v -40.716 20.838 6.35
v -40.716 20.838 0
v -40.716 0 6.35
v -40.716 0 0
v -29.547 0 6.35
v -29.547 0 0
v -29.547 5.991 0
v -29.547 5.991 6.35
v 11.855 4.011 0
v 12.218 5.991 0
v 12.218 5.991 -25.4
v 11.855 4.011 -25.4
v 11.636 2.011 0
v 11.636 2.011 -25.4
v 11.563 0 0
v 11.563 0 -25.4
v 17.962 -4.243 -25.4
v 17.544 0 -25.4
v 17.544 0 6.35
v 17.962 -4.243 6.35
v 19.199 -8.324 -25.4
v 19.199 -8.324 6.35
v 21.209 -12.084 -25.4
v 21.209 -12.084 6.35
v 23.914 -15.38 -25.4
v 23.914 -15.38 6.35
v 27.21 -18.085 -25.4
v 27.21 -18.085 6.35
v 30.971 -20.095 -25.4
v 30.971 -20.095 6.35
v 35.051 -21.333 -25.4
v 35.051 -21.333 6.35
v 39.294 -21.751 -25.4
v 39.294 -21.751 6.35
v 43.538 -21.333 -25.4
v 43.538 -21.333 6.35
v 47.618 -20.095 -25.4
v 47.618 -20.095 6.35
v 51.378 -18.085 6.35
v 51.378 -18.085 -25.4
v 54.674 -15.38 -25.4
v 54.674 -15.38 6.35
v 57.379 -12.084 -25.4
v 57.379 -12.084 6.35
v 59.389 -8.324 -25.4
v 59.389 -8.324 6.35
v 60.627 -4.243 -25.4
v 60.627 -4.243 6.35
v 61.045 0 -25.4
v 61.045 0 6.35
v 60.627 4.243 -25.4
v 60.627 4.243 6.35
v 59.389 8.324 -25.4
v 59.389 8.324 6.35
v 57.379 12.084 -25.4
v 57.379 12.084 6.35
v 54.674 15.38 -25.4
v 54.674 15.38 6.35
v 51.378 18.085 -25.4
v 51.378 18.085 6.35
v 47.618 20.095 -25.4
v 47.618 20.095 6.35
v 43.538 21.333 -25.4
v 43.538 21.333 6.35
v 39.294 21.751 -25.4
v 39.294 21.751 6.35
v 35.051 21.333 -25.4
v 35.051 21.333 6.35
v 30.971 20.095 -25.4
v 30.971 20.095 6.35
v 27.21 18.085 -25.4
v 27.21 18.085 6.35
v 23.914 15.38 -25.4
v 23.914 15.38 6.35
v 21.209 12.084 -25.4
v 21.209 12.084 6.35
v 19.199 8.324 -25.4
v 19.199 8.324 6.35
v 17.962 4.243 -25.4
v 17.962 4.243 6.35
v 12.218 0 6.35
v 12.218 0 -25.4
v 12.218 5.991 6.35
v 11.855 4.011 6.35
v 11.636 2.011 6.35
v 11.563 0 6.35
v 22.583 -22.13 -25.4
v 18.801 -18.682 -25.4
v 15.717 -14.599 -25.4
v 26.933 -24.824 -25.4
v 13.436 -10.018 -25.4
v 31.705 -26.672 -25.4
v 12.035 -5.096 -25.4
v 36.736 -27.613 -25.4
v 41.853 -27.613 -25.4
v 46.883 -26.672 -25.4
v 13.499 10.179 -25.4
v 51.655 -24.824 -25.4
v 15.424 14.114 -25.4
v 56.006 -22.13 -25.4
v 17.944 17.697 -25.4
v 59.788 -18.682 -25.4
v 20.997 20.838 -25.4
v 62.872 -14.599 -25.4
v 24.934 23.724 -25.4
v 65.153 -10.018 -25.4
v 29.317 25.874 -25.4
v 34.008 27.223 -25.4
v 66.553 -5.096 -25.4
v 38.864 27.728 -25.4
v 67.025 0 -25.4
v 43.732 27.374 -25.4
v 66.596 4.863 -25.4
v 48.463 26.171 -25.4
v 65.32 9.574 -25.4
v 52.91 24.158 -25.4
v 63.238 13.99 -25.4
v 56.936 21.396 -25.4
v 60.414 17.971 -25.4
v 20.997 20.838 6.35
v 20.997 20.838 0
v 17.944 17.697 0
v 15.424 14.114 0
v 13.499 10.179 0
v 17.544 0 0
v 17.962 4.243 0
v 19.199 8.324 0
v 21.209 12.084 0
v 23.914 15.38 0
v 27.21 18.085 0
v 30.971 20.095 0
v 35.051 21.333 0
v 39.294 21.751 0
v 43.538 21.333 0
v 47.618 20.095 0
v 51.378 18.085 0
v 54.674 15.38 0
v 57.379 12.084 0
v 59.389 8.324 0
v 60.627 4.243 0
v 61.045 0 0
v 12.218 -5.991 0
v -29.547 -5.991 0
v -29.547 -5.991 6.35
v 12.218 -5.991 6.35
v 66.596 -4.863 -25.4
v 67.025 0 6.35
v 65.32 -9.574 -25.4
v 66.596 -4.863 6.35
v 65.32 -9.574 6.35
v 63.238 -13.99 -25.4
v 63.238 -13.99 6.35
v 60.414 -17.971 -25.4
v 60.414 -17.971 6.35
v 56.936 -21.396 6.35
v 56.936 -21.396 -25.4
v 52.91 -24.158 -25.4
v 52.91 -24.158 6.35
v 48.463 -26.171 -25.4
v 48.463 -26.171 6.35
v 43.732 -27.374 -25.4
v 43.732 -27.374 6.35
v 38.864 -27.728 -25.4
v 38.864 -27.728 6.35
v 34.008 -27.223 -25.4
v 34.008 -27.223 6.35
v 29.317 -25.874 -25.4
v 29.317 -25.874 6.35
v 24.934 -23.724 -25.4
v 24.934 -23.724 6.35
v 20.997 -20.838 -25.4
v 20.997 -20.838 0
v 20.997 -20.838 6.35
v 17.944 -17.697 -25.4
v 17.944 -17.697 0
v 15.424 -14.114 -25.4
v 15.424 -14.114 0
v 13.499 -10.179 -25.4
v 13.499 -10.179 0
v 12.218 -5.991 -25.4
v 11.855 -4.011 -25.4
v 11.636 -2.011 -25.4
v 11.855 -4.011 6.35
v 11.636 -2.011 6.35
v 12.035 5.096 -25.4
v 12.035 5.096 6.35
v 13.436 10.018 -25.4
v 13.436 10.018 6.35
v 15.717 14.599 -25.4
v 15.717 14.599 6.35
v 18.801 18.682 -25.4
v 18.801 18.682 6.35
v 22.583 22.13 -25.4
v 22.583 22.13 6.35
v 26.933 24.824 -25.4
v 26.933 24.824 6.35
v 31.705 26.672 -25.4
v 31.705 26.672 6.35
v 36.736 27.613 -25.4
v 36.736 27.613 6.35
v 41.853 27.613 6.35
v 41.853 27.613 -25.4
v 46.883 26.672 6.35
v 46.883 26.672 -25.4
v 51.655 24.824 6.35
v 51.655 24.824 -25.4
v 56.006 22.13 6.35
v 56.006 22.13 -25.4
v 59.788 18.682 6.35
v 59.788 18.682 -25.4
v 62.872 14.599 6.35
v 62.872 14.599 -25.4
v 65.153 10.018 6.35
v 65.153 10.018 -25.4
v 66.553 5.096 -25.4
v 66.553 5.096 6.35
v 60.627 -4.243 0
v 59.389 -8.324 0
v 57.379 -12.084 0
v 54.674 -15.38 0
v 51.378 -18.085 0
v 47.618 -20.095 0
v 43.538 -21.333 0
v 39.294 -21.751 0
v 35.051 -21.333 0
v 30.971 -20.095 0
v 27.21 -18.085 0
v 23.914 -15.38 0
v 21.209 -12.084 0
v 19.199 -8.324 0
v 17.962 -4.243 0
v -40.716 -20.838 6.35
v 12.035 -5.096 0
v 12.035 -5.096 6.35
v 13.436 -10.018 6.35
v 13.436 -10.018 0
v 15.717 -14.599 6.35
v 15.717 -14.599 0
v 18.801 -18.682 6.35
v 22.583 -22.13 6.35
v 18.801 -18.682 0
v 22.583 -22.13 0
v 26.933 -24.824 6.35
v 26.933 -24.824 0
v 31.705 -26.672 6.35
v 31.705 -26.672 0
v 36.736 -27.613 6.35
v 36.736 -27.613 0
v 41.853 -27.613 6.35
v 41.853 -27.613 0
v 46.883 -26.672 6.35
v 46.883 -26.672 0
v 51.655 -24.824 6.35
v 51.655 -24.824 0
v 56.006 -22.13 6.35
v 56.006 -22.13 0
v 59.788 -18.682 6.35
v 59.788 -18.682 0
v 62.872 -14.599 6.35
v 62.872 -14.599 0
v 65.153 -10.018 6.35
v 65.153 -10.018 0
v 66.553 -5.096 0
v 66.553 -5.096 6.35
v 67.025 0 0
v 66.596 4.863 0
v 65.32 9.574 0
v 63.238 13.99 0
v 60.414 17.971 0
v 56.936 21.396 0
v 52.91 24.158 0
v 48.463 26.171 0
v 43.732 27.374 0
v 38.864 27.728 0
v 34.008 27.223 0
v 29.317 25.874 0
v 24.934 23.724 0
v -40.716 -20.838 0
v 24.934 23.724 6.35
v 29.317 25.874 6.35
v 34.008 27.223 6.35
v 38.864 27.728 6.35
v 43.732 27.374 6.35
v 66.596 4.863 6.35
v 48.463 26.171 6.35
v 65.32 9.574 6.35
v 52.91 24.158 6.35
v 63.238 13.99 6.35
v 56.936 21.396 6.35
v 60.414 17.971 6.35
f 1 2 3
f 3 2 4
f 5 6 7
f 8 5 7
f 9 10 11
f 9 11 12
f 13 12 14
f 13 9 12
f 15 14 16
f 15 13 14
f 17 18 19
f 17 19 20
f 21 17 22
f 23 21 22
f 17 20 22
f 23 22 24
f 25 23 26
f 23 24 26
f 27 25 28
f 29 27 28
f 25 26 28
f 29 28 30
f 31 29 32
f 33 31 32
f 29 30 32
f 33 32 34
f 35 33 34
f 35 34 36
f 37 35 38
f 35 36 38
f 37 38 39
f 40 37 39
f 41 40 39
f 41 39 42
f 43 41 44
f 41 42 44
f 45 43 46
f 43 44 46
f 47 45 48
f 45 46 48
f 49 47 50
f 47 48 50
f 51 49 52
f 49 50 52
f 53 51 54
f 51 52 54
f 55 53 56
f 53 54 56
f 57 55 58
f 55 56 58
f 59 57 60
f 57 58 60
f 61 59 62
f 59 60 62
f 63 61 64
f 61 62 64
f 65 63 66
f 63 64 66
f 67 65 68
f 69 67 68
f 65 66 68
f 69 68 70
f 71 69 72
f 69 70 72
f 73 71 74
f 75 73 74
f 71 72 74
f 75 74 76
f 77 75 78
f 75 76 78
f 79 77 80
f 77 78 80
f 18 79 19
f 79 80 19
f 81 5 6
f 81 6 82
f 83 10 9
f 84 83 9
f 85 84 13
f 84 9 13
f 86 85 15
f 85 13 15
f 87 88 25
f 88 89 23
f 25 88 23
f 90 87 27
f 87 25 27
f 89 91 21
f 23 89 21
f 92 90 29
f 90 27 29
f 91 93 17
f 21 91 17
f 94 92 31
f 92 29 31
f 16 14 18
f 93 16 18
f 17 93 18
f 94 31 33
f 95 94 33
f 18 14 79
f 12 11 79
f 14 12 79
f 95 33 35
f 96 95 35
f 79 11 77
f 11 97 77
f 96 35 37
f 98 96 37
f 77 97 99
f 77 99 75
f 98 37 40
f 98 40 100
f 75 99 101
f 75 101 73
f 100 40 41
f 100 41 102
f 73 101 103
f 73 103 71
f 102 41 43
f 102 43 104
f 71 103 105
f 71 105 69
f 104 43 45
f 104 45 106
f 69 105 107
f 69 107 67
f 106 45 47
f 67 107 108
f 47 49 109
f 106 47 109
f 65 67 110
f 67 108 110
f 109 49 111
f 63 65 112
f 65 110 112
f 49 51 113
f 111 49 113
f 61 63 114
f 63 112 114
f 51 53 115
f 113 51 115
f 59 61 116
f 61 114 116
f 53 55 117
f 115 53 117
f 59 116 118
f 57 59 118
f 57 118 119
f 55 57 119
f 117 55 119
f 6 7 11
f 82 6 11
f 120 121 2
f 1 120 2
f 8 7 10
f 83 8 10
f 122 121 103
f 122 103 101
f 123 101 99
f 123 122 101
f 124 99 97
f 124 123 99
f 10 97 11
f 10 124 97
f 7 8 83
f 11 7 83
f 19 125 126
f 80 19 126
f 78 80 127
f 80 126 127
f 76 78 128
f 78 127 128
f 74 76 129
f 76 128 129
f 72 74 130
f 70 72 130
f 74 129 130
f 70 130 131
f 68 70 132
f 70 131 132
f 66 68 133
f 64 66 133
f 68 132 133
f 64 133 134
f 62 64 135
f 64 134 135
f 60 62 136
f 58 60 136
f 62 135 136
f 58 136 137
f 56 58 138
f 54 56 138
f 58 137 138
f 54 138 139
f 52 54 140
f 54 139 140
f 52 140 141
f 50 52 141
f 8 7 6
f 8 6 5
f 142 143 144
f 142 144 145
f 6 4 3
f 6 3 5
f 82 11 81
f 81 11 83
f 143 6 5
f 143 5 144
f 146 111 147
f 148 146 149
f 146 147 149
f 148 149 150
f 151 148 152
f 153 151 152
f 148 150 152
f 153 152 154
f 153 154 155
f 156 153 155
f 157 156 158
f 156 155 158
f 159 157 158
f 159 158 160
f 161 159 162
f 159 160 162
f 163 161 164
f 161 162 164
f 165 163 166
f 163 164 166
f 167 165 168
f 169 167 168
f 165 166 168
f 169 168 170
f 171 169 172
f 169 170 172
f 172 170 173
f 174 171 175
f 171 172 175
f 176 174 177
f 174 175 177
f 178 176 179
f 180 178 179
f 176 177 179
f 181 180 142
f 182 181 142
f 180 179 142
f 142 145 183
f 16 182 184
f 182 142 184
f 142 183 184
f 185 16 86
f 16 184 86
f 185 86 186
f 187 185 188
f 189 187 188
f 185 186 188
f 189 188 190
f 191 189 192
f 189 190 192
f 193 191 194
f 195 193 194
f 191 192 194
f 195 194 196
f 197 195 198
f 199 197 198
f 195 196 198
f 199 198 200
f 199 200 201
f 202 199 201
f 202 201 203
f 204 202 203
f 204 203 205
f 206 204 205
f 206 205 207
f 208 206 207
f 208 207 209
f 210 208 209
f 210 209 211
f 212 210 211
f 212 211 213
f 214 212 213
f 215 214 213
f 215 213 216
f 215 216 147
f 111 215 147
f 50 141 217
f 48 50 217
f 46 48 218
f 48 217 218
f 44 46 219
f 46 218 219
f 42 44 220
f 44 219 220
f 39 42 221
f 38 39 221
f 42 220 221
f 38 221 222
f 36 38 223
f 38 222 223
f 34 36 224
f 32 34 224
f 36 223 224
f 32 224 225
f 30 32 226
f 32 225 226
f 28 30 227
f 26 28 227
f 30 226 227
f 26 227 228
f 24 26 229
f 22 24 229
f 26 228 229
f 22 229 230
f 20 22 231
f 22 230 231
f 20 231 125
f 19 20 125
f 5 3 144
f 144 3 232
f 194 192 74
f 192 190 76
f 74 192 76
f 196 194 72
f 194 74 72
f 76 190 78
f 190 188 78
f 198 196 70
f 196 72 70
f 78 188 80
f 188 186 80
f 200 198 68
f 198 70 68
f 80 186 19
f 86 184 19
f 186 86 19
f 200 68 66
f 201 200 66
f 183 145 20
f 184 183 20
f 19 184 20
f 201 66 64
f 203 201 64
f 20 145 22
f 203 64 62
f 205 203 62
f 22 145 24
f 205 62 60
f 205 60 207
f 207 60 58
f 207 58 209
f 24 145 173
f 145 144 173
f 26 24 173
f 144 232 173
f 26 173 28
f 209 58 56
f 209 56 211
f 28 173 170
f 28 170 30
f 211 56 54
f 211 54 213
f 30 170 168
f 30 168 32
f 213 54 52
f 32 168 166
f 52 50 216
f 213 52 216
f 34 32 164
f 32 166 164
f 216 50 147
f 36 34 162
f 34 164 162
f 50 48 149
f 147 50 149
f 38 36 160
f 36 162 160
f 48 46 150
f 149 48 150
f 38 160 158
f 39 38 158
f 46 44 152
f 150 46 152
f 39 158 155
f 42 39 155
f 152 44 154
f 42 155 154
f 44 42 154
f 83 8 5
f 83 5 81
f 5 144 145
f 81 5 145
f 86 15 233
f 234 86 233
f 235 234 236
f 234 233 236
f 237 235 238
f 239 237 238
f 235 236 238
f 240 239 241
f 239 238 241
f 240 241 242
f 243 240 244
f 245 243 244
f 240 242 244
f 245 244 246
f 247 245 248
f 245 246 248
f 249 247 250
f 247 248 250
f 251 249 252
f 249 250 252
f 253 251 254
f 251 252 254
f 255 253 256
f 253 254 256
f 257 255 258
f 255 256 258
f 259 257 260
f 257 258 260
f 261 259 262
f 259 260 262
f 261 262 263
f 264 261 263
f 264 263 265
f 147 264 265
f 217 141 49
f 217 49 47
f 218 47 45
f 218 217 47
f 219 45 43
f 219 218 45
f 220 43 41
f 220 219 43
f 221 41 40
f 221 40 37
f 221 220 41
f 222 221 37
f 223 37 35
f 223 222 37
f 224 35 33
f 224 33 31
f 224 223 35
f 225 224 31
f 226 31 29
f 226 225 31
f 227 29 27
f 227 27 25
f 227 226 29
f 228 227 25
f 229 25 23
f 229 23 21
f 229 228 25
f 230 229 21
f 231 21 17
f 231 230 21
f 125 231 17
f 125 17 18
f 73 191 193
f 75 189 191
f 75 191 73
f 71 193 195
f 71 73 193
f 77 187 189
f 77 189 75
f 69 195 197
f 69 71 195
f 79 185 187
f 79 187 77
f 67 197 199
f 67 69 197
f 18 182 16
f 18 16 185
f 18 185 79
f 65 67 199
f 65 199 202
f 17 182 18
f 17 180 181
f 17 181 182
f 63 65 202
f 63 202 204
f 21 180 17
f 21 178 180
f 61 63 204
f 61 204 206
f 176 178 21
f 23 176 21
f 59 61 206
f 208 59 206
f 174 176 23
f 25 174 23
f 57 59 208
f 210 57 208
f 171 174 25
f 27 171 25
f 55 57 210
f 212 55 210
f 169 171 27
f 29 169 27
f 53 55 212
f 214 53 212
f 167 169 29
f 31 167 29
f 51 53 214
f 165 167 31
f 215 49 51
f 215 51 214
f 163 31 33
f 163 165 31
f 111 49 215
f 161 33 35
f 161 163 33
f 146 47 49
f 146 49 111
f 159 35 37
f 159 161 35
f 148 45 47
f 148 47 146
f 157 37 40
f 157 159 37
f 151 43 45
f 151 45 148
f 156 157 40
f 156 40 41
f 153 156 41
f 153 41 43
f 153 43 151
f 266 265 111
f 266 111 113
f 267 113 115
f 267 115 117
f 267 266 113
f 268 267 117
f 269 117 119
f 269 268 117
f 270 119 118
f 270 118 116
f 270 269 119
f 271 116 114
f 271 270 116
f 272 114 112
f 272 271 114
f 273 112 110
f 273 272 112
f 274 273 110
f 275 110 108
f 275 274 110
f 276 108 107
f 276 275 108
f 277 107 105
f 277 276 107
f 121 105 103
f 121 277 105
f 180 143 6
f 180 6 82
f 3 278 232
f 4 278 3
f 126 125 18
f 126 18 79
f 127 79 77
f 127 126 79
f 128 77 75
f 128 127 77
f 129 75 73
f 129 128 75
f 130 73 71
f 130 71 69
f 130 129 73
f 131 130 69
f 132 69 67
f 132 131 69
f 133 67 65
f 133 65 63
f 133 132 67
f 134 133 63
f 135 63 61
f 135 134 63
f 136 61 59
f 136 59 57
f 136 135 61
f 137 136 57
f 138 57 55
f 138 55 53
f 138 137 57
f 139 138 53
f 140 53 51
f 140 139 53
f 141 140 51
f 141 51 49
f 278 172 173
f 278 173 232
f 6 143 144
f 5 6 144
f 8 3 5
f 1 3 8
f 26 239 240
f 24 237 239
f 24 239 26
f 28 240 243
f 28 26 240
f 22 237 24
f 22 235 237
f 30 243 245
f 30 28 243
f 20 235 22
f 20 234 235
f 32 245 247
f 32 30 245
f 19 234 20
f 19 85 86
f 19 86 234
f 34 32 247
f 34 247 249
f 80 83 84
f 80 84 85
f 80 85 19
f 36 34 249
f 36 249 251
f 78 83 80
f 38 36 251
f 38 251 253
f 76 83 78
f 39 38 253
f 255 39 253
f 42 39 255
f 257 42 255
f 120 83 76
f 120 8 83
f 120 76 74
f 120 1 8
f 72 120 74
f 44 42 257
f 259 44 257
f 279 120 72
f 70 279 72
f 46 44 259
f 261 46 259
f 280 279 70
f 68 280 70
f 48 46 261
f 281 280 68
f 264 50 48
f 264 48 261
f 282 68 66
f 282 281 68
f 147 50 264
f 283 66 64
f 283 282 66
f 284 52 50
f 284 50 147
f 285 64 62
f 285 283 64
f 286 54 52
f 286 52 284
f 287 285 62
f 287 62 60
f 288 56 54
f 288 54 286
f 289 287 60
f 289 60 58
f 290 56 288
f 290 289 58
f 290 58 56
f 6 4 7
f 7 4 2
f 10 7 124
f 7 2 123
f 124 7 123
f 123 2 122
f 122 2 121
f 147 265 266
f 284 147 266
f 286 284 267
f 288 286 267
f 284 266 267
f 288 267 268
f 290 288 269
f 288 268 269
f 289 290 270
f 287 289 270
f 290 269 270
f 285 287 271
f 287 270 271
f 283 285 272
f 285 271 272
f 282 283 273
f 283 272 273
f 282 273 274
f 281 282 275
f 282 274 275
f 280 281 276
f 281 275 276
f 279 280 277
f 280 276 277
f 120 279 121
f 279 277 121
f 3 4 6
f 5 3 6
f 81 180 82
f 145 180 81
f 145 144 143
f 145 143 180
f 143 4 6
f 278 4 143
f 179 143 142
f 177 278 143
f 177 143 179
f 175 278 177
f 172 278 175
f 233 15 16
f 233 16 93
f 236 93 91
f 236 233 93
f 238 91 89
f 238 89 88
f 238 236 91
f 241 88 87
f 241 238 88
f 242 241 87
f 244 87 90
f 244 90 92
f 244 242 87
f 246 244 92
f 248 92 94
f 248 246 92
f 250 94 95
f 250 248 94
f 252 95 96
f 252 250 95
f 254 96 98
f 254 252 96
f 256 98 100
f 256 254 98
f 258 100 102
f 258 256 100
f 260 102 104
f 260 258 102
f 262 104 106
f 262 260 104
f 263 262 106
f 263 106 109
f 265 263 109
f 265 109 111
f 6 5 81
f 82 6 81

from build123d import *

# Parameters (mm, degrees)
F1_DEPTH = 6.35
F2_DEPTH = 6.35
F3_DEPTH = 25.4
F4_W     = 41.7647836408
F4_H     = 6.35
F5_DEPTH = 5.99059


with BuildPart() as f1:
    # F0 (on Top) → F1 (new body)
    with BuildSketch(Plane.XY):
        with BuildLine():
            ThreePointArc((12.2179435245, 5.9905964881), (15.4237541749, 14.1142861518), (20.997064695, 20.8381069054))
            Line((20.997064695, 20.8381069054), (-40.7157503068, 20.8381069054))
            Line((-40.7157503068, 20.8381069054), (-40.7157503068, 0))
            Line((-40.7157503068, 0), (-29.5468401164, 0))
            Line((-29.5468401164, 0), (-29.5468401164, 5.9905964881))
            Line((-29.5468401164, 5.9905964881), (12.2179435245, 5.9905964881))
        make_face()
    extrude(amount=F1_DEPTH)

    # F0 (on Top) → F2 (join)
    with BuildSketch(Plane.XY):
        with BuildLine():
            Line((61.0449077465, 0), (67.0253527713, 0))
            ThreePointArc((67.0253527713, 0), (50.7313138176, 25.2627690615), (20.997064695, 20.8381069054))
            ThreePointArc((20.997064695, 20.8381069054), (15.4237541749, 14.1142861518), (12.2179435245, 5.9905964881))
            ThreePointArc((12.2179435245, 5.9905964881), (11.7273383811, 3.0131376464), (11.5631552983, 0))
            Line((11.5631552983, 0), (17.543600323, 0))
            ThreePointArc((17.543600323, 0), (39.2942540348, 21.7506537117), (61.0449077465, 0))
        make_face()
        with BuildLine():
            ThreePointArc((11.5631552983, 0), (39.2942540348, -27.7310987365), (67.0253527713, 0))
            Line((67.0253527713, 0), (61.0449077465, 0))
            ThreePointArc((61.0449077465, 0), (39.2942540348, -21.7506537117), (17.543600323, 0))
            Line((17.543600323, 0), (11.5631552983, 0))
        make_face()
    extrude(amount=F2_DEPTH)

    # F0 (on Top) → F3 (join)
    with BuildSketch(Plane.XY):
        with BuildLine():
            Line((61.0449077465, 0), (67.0253527713, 0))
            ThreePointArc((67.0253527713, 0), (50.7313138176, 25.2627690615), (20.997064695, 20.8381069054))
            ThreePointArc((20.997064695, 20.8381069054), (15.4237541749, 14.1142861518), (12.2179435245, 5.9905964881))
            ThreePointArc((12.2179435245, 5.9905964881), (11.7273383811, 3.0131376464), (11.5631552983, 0))
            Line((11.5631552983, 0), (17.543600323, 0))
            ThreePointArc((17.543600323, 0), (39.2942540348, 21.7506537117), (61.0449077465, 0))
        make_face()
        with BuildLine():
            ThreePointArc((11.5631552983, 0), (39.2942540348, -27.7310987365), (67.0253527713, 0))
            Line((67.0253527713, 0), (61.0449077465, 0))
            ThreePointArc((61.0449077465, 0), (39.2942540348, -21.7506537117), (17.543600323, 0))
            Line((17.543600323, 0), (11.5631552983, 0))
        make_face()
    extrude(amount=-F3_DEPTH)


with BuildPart() as f5:
    # F4 (on face) → F5 (new body)
    with BuildSketch(Plane.XZ.offset(-5.9905964881)):
        Polygon((12.2179435245, -25.4), (12.2179435245, 0), (-29.5468401164, 0), align=None)
        with Locations((-8.664448296, 3.175)):
            Rectangle(F4_W, F4_H)
    extrude(amount=F5_DEPTH)


with BuildPart() as f6_1:
    # F6: instance of F1
    add(f1.part.mirror(Plane.XZ))


with BuildPart() as f6_2:
    # F6: instance of F5
    add(f5.part.mirror(Plane.XZ))


solid = Compound([f1.part, f5.part, f6_1.part, f6_2.part])
